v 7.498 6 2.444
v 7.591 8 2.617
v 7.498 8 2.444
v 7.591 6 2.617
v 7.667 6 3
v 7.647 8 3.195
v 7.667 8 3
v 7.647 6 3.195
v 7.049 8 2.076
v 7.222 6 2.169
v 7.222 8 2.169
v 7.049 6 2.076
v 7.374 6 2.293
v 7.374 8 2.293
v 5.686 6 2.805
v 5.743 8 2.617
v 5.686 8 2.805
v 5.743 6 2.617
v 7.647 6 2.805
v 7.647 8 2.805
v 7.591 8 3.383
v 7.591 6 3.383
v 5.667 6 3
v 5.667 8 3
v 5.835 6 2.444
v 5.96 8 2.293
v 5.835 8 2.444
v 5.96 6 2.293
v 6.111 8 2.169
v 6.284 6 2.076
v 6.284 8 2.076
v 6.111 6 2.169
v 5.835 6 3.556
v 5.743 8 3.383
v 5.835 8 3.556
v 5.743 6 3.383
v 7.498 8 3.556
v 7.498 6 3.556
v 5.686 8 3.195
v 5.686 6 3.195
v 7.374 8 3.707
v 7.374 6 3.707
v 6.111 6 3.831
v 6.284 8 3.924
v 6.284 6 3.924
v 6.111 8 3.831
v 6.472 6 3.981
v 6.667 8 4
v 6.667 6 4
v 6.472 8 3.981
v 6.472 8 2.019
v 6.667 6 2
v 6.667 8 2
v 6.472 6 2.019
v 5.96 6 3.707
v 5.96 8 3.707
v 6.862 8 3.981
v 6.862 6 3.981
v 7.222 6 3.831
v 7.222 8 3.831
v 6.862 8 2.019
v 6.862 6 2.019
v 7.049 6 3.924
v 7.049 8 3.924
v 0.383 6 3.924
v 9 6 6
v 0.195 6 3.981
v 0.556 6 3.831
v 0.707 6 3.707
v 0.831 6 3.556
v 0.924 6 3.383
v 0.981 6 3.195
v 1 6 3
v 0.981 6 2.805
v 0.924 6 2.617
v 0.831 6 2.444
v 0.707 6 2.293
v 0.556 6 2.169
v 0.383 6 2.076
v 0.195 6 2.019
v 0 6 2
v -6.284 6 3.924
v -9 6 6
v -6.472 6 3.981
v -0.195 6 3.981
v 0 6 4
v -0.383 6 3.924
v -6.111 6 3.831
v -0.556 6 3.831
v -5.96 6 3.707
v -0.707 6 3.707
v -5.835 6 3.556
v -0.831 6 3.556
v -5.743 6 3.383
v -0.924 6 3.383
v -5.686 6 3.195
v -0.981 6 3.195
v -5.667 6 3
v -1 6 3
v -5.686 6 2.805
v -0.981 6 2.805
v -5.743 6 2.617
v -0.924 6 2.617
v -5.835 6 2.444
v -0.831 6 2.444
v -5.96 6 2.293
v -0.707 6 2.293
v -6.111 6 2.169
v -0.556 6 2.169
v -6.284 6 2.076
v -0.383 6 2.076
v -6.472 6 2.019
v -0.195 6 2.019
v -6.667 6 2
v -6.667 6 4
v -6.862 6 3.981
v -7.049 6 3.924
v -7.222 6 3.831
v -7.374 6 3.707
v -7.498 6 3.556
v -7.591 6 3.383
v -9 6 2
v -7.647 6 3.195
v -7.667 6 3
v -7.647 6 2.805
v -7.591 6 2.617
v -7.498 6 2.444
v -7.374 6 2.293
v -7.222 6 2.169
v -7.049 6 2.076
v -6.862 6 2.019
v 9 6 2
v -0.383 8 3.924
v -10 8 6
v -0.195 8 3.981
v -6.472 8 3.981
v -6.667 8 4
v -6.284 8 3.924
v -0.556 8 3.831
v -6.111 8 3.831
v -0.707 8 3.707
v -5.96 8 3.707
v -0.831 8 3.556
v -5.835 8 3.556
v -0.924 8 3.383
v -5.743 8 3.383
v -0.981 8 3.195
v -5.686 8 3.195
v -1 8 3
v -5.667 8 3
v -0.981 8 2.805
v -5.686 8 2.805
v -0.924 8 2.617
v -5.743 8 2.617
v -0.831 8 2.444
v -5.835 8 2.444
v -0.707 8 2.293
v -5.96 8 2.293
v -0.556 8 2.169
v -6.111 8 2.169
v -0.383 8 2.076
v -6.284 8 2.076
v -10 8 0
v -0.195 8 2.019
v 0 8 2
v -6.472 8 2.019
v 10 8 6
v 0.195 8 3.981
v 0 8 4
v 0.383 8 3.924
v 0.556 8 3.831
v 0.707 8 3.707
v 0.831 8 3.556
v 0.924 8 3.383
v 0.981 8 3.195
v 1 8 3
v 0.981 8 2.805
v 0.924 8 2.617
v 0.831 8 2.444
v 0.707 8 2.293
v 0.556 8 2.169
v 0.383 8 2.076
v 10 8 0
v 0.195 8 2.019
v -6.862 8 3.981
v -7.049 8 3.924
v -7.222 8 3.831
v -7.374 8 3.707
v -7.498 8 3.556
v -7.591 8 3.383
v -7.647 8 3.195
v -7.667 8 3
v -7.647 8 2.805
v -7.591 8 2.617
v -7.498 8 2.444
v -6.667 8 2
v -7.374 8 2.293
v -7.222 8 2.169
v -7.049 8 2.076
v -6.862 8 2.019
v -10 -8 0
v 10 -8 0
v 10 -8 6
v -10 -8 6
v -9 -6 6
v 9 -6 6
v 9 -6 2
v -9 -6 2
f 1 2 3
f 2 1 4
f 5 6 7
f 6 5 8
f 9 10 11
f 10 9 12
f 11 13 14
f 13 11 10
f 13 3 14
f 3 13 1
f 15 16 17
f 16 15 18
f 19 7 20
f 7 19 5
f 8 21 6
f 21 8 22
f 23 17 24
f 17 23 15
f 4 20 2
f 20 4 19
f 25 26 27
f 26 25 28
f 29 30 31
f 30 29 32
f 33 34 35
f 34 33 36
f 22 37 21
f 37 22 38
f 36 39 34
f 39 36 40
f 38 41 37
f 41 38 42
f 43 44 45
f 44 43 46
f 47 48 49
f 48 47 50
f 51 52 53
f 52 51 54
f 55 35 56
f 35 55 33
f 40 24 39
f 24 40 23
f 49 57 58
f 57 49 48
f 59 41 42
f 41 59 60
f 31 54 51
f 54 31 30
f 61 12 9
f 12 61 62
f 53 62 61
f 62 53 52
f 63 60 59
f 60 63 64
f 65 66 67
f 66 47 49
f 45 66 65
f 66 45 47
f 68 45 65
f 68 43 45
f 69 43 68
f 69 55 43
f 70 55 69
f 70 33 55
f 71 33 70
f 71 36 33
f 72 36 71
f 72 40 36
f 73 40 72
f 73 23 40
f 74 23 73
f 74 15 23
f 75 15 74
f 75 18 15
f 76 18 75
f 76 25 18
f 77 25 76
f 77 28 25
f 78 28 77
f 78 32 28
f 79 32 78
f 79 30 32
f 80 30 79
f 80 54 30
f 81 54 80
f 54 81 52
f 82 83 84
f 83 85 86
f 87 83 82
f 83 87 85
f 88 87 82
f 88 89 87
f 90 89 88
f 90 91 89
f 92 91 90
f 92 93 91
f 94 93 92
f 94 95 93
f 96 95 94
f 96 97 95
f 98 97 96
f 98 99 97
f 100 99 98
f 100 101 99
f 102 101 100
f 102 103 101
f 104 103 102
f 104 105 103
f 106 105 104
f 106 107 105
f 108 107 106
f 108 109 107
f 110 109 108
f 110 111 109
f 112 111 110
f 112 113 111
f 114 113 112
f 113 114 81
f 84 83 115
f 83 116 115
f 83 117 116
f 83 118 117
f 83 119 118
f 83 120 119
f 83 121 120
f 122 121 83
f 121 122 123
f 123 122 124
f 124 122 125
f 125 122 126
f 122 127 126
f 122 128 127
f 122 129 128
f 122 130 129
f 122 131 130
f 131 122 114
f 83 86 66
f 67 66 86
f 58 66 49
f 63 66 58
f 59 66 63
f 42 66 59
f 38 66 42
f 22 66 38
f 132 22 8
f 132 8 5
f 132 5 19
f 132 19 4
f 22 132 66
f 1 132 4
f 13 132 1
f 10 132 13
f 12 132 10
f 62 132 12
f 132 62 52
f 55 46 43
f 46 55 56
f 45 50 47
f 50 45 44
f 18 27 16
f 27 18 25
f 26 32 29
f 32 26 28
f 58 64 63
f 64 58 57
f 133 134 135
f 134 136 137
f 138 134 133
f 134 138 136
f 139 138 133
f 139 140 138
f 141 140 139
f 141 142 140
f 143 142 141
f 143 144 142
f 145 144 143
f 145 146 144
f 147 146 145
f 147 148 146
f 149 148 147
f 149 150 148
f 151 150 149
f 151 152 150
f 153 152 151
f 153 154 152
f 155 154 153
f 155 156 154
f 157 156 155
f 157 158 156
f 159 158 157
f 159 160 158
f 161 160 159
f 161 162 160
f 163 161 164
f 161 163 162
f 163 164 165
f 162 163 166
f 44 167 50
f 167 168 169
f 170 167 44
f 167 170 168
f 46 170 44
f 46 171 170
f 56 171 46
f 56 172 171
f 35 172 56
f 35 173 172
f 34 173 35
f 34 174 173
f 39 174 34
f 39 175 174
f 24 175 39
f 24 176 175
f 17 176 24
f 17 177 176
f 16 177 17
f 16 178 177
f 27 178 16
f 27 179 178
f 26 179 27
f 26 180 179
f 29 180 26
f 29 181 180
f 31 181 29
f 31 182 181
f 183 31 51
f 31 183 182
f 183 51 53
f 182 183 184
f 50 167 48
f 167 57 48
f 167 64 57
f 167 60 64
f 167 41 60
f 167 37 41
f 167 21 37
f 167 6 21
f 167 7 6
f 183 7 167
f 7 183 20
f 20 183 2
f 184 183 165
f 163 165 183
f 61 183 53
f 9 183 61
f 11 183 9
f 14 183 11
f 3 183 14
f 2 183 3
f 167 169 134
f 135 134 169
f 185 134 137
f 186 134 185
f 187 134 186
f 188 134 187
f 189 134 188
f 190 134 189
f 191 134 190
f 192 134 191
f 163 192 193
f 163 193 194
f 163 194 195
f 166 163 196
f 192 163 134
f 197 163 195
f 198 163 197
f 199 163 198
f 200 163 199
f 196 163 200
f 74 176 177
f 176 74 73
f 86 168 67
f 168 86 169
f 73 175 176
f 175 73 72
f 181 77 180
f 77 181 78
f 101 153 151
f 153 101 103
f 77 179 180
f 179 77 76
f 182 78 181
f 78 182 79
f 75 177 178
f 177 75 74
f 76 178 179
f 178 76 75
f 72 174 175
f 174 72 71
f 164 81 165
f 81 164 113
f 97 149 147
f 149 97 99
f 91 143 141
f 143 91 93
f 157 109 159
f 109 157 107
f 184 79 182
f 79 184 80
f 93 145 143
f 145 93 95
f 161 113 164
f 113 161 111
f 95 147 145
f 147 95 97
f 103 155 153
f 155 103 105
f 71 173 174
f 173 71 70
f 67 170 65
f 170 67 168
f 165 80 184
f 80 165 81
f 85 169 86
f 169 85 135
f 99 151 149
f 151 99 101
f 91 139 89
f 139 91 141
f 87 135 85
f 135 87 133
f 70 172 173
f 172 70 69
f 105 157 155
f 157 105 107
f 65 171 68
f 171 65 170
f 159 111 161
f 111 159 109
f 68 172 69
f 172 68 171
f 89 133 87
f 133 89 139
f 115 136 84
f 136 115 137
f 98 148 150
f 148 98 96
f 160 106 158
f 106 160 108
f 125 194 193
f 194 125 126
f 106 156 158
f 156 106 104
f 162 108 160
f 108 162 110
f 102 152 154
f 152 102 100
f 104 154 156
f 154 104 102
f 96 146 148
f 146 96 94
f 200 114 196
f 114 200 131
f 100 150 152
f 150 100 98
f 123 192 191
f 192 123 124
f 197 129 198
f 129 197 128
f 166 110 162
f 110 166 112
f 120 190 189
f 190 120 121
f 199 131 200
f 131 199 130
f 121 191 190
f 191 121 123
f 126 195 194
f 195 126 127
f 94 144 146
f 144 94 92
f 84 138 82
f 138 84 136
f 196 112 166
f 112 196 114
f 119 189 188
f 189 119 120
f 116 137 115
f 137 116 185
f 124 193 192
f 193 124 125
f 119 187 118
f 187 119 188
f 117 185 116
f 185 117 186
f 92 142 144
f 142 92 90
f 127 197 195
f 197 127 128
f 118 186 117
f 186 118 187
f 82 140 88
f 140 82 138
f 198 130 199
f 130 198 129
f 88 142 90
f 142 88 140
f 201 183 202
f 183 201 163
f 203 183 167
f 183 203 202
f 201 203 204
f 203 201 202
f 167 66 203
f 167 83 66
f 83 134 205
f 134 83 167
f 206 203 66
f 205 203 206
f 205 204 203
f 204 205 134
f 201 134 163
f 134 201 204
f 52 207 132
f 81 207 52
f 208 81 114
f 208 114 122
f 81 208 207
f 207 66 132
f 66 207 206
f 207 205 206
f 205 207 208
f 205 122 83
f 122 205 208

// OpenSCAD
difference()
{
    linear_extrude(height = 6.0, twist = 0.0, scale = 1.0, slices = 1, center = false)
    {
        scale([20.0, 16.0])
        {
            M8();
        }
    }
    translate([0.0, 0.0, 2.0])
    {
        linear_extrude(height = 7.0, twist = 0.0, scale = 1.0, slices = 1, center = false)
        {
            scale([18.0, 12.0])
            {
                M8();
            }
        }
    }
    union()
    {
        translate([0.0, 0.0, 0.0])
        {
            translate([6.666666666666667, 8.0, 3.0])
            {
                rotate([90.0, 0.0, 0.0])
                {
                    linear_extrude(height = 2.0, twist = 0.0, scale = 1.0, slices = 1, center = false)
                    {
                        scale([2.0, 2.0])
                        {
                            M52();
                        }
                    }
                }
            }
        }
        translate([-6.666666666666667, 0.0, 0.0])
        {
            translate([6.666666666666667, 8.0, 3.0])
            {
                rotate([90.0, 0.0, 0.0])
                {
                    linear_extrude(height = 2.0, twist = 0.0, scale = 1.0, slices = 1, center = false)
                    {
                        scale([2.0, 2.0])
                        {
                            M52();
                        }
                    }
                }
            }
        }
        translate([-13.333333333333334, 0.0, 0.0])
        {
            translate([6.666666666666667, 8.0, 3.0])
            {
                rotate([90.0, 0.0, 0.0])
                {
                    linear_extrude(height = 2.0, twist = 0.0, scale = 1.0, slices = 1, center = false)
                    {
                        scale([2.0, 2.0])
                        {
                            M52();
                        }
                    }
                }
            }
        }
    }
}

module M52()
{
    polygon
    (
        points =
        [
            [0.5, 0.0], 
            [0.4903926402016152, 0.09754516100806412], 
            [0.46193976625564337, 0.1913417161825449], 
            [0.4157348061512726, 0.2777851165098011], 
            [0.3535533905932738, 0.35355339059327373], 
            [0.27778511650980114, 0.4157348061512726], 
            [0.19134171618254492, 0.46193976625564337], 
            [0.09754516100806417, 0.4903926402016152], 
            [3.061616997868383E-17, 0.5], 
            [-0.0975451610080641, 0.4903926402016152], 
            [-0.19134171618254486, 0.46193976625564337], 
            [-0.277785116509801, 0.41573480615127273], 
            [-0.35355339059327373, 0.3535533905932738], 
            [-0.4157348061512727, 0.2777851165098011], 
            [-0.46193976625564337, 0.19134171618254495], 
            [-0.4903926402016152, 0.0975451610080643], 
            [-0.5, 6.123233995736766E-17], 
            [-0.4903926402016152, -0.09754516100806418], 
            [-0.4619397662556434, -0.19134171618254484], 
            [-0.41573480615127273, -0.277785116509801], 
            [-0.35355339059327384, -0.35355339059327373], 
            [-0.2777851165098011, -0.4157348061512726], 
            [-0.19134171618254517, -0.46193976625564326], 
            [-0.09754516100806433, -0.49039264020161516], 
            [-9.184850993605148E-17, -0.5], 
            [0.09754516100806415, -0.4903926402016152], 
            [0.191341716182545, -0.4619397662556433], 
            [0.2777851165098009, -0.41573480615127273], 
            [0.3535533905932737, -0.35355339059327384], 
            [0.4157348061512726, -0.2777851165098011], 
            [0.46193976625564326, -0.1913417161825452], 
            [0.49039264020161516, -0.09754516100806436]
        ],
        paths =
        [
            [0, 1, 2, 3, 4, 5, 6, 7, 8, 9, 10, 11, 12, 13, 14, 15, 16, 17, 18, 19, 20, 21, 22, 23, 24, 25, 26, 27, 28, 29, 30, 31]
        ]
    );
}

module M8()
{
    polygon
    (
        points =
        [
            [-0.5, -0.5], 
            [0.5, -0.5], 
            [0.5, 0.5], 
            [-0.5, 0.5]
        ],
        paths =
        [
            [0, 1, 2, 3]
        ]
    );
}
